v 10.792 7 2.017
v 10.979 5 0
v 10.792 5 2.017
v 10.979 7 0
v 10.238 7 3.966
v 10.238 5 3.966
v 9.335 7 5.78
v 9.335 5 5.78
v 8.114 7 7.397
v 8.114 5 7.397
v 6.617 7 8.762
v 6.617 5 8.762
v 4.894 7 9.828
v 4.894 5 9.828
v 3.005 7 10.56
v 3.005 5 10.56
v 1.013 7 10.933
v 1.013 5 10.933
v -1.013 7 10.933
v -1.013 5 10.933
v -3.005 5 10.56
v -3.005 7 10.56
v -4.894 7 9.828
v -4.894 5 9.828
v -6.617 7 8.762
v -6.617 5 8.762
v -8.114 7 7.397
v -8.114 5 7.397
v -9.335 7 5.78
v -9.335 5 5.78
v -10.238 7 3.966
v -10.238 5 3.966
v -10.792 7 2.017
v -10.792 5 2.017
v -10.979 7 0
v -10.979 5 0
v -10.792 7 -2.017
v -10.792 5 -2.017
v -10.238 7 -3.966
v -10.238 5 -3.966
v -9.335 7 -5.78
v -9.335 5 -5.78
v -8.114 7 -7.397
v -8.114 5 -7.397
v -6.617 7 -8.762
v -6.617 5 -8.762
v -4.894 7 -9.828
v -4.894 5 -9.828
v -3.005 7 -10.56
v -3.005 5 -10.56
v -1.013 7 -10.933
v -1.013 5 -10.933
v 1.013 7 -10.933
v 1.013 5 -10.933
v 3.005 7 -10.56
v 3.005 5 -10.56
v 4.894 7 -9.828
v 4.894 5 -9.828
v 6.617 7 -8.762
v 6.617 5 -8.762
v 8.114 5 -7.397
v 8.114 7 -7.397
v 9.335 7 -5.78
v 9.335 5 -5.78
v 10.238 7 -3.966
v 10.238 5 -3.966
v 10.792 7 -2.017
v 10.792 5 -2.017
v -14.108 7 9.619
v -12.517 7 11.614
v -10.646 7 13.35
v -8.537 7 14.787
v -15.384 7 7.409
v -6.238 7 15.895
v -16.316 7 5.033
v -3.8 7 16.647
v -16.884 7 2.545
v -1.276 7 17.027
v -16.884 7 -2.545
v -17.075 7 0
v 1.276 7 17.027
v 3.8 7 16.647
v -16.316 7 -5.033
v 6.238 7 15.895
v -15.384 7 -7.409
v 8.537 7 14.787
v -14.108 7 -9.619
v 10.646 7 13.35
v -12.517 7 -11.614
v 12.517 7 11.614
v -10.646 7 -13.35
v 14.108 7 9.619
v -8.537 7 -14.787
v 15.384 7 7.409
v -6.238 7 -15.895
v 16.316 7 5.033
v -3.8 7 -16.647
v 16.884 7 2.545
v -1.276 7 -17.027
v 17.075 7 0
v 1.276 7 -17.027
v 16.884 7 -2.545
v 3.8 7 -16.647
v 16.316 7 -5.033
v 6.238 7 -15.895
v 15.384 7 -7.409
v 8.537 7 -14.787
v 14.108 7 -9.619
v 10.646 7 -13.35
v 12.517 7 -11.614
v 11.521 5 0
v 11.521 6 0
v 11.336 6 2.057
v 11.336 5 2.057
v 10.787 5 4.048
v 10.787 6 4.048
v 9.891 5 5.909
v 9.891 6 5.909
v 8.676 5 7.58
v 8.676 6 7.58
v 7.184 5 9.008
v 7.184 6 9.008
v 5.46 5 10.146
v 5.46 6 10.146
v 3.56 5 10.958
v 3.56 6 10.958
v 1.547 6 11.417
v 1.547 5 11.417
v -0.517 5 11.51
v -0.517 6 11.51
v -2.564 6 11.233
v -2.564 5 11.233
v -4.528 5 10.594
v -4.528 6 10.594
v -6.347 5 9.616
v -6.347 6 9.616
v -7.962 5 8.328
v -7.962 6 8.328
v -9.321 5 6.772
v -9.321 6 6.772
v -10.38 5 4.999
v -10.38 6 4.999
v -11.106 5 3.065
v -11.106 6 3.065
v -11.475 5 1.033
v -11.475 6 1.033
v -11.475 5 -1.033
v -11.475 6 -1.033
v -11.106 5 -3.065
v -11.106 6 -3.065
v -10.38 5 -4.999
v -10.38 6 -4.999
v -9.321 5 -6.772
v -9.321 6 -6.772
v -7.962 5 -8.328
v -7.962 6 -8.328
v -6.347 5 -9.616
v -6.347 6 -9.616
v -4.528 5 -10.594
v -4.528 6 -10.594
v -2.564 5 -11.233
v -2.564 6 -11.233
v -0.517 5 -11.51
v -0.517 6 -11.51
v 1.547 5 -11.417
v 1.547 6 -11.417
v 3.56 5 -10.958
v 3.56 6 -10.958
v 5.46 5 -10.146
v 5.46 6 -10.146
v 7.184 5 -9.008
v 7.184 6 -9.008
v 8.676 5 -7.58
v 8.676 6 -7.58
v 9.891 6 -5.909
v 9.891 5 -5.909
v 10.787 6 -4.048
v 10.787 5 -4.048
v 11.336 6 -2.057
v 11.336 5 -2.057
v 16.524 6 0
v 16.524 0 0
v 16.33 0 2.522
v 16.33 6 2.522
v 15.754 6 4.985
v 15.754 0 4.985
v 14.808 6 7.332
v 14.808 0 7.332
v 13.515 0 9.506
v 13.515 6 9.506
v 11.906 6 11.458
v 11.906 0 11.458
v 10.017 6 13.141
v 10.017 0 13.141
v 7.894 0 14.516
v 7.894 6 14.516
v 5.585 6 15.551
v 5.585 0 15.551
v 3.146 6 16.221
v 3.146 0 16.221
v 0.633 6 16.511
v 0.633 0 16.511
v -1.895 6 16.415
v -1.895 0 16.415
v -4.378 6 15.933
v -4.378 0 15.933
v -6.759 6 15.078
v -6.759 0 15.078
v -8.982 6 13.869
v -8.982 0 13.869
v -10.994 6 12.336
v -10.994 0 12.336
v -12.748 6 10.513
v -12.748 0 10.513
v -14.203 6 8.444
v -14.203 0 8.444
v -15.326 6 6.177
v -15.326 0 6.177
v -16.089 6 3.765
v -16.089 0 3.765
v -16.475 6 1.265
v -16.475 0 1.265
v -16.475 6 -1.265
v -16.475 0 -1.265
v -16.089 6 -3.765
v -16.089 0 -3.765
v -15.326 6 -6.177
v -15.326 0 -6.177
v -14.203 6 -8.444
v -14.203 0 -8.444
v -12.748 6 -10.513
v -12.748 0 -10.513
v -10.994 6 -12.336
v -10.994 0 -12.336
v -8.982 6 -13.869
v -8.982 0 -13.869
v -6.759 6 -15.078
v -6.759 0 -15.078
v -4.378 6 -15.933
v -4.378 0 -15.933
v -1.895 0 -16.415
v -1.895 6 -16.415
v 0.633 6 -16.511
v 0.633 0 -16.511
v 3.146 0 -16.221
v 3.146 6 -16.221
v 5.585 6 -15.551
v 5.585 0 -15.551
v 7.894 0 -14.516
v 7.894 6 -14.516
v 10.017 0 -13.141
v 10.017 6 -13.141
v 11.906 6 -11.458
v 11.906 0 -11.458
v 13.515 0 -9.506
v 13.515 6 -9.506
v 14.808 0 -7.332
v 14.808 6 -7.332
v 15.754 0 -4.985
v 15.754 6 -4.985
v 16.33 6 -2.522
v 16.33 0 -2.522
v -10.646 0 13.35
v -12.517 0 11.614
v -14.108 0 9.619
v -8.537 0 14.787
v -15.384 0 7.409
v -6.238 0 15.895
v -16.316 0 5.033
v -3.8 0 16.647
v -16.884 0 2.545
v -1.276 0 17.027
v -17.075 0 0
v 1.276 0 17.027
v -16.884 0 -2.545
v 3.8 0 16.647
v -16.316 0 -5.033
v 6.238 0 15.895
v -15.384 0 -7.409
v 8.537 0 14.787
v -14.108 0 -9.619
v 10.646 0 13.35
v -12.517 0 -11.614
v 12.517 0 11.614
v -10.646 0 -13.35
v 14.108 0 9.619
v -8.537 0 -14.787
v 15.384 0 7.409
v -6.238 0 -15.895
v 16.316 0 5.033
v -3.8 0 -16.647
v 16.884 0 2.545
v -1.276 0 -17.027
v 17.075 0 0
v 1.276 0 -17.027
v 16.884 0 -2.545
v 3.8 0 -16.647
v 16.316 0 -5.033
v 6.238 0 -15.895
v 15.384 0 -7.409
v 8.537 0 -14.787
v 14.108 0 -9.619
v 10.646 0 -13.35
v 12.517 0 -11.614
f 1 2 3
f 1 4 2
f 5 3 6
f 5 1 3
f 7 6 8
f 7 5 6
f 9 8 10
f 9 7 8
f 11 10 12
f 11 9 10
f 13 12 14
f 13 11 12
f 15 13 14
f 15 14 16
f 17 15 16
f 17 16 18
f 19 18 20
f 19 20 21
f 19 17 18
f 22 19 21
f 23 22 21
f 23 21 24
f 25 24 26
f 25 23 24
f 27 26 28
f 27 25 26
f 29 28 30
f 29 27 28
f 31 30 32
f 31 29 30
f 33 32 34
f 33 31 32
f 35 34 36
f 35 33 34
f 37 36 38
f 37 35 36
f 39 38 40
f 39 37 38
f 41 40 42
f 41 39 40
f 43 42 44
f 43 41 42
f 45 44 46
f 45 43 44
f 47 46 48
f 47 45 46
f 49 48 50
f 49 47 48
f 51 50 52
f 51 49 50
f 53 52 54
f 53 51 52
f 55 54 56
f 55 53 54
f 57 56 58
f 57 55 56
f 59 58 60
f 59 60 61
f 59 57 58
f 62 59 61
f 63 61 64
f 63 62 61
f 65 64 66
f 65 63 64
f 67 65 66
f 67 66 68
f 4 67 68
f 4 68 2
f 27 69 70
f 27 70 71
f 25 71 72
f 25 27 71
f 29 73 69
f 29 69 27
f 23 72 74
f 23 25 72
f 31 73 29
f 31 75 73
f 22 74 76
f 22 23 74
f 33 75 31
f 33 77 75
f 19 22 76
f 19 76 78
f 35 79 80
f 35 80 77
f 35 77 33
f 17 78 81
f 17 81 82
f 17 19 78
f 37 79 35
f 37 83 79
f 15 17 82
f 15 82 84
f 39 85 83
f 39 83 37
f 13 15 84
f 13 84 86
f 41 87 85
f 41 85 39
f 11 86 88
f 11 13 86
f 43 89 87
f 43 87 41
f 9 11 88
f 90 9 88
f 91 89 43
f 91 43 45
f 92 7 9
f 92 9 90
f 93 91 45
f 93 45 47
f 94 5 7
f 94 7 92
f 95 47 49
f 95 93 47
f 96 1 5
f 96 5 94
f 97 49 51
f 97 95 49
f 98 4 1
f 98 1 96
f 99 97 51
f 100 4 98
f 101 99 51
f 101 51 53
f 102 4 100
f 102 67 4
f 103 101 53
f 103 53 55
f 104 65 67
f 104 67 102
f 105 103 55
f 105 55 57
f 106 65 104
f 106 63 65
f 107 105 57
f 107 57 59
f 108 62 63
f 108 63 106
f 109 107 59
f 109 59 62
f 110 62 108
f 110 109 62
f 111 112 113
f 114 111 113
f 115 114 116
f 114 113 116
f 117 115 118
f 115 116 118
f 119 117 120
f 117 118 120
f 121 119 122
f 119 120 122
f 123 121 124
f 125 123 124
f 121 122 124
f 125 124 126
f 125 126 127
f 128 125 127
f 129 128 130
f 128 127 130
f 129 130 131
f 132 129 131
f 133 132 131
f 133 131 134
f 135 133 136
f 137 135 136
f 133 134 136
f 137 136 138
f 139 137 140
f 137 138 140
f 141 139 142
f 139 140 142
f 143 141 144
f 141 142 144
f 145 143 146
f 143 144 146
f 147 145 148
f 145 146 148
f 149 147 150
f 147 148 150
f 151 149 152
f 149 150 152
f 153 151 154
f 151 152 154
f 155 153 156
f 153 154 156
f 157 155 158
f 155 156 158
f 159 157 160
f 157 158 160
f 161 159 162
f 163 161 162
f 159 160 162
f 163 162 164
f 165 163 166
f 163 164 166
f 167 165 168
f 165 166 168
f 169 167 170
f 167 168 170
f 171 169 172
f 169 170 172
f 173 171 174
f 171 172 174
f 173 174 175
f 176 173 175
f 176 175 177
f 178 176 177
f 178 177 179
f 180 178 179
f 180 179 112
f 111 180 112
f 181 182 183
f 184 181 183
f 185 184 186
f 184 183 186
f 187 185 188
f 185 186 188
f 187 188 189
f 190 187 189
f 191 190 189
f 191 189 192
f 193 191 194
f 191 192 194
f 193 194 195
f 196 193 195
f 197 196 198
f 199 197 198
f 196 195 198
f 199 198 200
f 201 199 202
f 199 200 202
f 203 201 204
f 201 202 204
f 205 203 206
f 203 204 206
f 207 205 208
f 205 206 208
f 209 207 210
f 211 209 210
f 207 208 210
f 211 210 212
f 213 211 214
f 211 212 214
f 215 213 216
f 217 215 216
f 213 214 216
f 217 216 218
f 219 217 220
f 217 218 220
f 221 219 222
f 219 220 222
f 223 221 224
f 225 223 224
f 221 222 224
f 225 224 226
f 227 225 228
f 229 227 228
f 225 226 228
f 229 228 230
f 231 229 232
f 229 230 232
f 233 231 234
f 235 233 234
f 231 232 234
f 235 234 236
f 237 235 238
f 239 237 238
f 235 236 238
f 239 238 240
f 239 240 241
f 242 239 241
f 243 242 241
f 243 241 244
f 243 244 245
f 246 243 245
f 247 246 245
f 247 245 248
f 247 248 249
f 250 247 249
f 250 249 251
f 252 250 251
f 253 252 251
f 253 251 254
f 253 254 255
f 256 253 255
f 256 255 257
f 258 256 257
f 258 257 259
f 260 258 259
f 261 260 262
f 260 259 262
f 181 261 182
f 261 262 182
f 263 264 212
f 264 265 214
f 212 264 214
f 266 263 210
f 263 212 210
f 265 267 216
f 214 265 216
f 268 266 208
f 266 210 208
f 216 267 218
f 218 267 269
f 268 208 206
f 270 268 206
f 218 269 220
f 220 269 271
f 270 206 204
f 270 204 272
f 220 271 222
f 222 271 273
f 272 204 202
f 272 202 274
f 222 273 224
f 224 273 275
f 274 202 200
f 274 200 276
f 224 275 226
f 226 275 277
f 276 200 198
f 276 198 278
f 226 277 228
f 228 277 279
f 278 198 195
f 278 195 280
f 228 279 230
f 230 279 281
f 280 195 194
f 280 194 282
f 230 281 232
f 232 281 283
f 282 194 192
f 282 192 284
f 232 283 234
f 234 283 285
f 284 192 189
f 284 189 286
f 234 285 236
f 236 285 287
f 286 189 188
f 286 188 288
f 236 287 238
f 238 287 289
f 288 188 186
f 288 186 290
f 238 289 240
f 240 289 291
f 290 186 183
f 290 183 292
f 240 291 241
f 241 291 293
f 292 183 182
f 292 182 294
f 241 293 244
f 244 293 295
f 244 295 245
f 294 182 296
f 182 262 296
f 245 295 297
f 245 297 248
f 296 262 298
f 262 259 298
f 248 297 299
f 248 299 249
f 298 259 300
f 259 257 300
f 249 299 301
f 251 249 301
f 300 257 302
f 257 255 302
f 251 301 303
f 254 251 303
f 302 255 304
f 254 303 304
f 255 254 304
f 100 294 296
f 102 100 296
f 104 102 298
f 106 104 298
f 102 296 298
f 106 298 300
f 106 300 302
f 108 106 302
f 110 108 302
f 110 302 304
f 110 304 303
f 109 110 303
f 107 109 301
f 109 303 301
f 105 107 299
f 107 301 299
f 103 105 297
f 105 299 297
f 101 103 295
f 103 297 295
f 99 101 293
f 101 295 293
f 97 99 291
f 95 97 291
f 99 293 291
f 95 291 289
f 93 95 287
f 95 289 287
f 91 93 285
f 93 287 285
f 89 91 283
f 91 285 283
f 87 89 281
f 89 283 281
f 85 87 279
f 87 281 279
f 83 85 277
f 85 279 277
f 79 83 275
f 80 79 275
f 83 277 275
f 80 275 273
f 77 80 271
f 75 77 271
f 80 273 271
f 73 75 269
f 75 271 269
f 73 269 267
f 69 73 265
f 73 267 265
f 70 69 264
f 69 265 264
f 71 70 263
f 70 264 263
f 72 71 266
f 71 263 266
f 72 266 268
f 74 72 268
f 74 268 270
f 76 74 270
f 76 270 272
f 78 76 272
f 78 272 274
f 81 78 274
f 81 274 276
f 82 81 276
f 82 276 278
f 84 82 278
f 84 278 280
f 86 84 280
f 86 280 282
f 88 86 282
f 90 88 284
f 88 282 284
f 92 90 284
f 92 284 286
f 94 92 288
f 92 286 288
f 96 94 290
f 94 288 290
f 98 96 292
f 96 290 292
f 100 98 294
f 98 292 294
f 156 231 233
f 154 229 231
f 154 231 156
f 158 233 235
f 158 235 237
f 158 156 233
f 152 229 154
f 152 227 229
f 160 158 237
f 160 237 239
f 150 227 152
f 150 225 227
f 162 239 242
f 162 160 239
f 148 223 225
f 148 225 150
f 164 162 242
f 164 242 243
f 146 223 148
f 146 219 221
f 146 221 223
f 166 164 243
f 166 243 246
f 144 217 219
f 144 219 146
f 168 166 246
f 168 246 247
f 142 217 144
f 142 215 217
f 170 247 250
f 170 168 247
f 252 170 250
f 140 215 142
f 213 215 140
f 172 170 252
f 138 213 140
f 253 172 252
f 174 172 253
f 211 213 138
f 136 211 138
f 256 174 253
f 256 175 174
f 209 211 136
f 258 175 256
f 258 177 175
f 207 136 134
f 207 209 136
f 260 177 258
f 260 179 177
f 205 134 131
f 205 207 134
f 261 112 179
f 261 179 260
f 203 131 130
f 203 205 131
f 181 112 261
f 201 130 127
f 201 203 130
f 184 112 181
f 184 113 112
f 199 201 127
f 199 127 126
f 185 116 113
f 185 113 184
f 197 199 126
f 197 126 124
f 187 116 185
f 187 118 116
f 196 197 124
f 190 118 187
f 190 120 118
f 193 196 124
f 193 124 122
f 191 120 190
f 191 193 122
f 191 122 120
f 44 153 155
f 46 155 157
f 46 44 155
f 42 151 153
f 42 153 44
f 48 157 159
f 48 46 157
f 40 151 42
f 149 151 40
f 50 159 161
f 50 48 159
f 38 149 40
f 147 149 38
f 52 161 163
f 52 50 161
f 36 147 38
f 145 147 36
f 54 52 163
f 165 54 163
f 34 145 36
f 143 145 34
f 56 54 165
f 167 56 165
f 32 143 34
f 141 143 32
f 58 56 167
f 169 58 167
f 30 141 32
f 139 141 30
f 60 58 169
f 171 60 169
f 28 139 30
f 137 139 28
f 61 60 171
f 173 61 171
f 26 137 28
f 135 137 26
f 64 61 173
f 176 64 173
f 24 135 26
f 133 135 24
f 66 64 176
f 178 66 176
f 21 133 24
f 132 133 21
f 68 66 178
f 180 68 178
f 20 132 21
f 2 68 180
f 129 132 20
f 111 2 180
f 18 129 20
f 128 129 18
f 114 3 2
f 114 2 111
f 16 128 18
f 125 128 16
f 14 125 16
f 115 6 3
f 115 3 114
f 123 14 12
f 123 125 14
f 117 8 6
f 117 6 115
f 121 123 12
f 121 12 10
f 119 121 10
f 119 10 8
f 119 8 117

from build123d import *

# Parameters (mm, degrees)
CROQUIS1_R              = 17.074936514
SALIENTE_EXTRUIR2_DEPTH = 7
CROQUIS3_R              = 10.273489903
CORTAR_EXTRUIR1_DEPTH   = 4
CROQUIS4_R              = 11.220368527
CORTAR_EXTRUIR2_DEPTH   = 2
CROQUIS5_R              = 10.546758953
CORTAR_EXTRUIR4_DEPTH   = 8
CROQUIS6_R              = 16.523562211
CORTAR_EXTRUIR6_DEPTH   = 6
CROQUIS9_R              = 10.979364786
CROQUIS9_R_2            = 10.546758953
CORTAR_EXTRUIR8_DEPTH   = 1
CROQUIS10_R             = 11.521476728
CROQUIS10_R_2           = 10.979364786
SALIENTE_EXTRUIR3_DEPTH = 1


with BuildPart() as part:
    # Croquis1 → Saliente-Extruir2 (new body)
    with BuildSketch(Plane(origin=(0, 0, 0), x_dir=(1, 0, 0), z_dir=(0, 1, 0))):
        Circle(CROQUIS1_R)
    extrude(amount=SALIENTE_EXTRUIR2_DEPTH)

    # Croquis3 → Cortar-Extruir1 (cut)
    with BuildSketch(Plane(origin=(0, 7, 0), x_dir=(1, 0, 0), z_dir=(0, 1, 0))):
        Circle(CROQUIS3_R)
    extrude(amount=-CORTAR_EXTRUIR1_DEPTH, mode=Mode.SUBTRACT)

    # Croquis4 → Cortar-Extruir2 (cut)
    with BuildSketch(Plane(origin=(0, 0, 0), x_dir=(1, 0, 0), z_dir=(0, 1, 0))):
        Circle(CROQUIS4_R)
    extrude(amount=CORTAR_EXTRUIR2_DEPTH, mode=Mode.SUBTRACT)

    # Croquis5 → Cortar-Extruir4 (cut, through all)
    with BuildSketch(Plane(origin=(0, 0, 0), x_dir=(1, 0, 0), z_dir=(0, 1, 0))):
        Circle(CROQUIS5_R)
    extrude(amount=CORTAR_EXTRUIR4_DEPTH, mode=Mode.SUBTRACT)

    # Croquis6 → Cortar-Extruir6 (cut)
    with BuildSketch(Plane.XZ):
        Circle(CROQUIS6_R)
    extrude(amount=-CORTAR_EXTRUIR6_DEPTH, mode=Mode.SUBTRACT)

    # Croquis9 → Cortar-Extruir8 (cut)
    with BuildSketch(Plane.XZ.offset(-6)):
        Circle(CROQUIS9_R)
        Circle(CROQUIS9_R_2, mode=Mode.SUBTRACT)
    extrude(amount=-CORTAR_EXTRUIR8_DEPTH, mode=Mode.SUBTRACT)

    # Croquis10 → Saliente-Extruir3 (add)
    with BuildSketch(Plane.XZ.offset(-6)):
        Circle(CROQUIS10_R)
        Circle(CROQUIS10_R_2, mode=Mode.SUBTRACT)
    extrude(amount=SALIENTE_EXTRUIR3_DEPTH)


solid = part.part
